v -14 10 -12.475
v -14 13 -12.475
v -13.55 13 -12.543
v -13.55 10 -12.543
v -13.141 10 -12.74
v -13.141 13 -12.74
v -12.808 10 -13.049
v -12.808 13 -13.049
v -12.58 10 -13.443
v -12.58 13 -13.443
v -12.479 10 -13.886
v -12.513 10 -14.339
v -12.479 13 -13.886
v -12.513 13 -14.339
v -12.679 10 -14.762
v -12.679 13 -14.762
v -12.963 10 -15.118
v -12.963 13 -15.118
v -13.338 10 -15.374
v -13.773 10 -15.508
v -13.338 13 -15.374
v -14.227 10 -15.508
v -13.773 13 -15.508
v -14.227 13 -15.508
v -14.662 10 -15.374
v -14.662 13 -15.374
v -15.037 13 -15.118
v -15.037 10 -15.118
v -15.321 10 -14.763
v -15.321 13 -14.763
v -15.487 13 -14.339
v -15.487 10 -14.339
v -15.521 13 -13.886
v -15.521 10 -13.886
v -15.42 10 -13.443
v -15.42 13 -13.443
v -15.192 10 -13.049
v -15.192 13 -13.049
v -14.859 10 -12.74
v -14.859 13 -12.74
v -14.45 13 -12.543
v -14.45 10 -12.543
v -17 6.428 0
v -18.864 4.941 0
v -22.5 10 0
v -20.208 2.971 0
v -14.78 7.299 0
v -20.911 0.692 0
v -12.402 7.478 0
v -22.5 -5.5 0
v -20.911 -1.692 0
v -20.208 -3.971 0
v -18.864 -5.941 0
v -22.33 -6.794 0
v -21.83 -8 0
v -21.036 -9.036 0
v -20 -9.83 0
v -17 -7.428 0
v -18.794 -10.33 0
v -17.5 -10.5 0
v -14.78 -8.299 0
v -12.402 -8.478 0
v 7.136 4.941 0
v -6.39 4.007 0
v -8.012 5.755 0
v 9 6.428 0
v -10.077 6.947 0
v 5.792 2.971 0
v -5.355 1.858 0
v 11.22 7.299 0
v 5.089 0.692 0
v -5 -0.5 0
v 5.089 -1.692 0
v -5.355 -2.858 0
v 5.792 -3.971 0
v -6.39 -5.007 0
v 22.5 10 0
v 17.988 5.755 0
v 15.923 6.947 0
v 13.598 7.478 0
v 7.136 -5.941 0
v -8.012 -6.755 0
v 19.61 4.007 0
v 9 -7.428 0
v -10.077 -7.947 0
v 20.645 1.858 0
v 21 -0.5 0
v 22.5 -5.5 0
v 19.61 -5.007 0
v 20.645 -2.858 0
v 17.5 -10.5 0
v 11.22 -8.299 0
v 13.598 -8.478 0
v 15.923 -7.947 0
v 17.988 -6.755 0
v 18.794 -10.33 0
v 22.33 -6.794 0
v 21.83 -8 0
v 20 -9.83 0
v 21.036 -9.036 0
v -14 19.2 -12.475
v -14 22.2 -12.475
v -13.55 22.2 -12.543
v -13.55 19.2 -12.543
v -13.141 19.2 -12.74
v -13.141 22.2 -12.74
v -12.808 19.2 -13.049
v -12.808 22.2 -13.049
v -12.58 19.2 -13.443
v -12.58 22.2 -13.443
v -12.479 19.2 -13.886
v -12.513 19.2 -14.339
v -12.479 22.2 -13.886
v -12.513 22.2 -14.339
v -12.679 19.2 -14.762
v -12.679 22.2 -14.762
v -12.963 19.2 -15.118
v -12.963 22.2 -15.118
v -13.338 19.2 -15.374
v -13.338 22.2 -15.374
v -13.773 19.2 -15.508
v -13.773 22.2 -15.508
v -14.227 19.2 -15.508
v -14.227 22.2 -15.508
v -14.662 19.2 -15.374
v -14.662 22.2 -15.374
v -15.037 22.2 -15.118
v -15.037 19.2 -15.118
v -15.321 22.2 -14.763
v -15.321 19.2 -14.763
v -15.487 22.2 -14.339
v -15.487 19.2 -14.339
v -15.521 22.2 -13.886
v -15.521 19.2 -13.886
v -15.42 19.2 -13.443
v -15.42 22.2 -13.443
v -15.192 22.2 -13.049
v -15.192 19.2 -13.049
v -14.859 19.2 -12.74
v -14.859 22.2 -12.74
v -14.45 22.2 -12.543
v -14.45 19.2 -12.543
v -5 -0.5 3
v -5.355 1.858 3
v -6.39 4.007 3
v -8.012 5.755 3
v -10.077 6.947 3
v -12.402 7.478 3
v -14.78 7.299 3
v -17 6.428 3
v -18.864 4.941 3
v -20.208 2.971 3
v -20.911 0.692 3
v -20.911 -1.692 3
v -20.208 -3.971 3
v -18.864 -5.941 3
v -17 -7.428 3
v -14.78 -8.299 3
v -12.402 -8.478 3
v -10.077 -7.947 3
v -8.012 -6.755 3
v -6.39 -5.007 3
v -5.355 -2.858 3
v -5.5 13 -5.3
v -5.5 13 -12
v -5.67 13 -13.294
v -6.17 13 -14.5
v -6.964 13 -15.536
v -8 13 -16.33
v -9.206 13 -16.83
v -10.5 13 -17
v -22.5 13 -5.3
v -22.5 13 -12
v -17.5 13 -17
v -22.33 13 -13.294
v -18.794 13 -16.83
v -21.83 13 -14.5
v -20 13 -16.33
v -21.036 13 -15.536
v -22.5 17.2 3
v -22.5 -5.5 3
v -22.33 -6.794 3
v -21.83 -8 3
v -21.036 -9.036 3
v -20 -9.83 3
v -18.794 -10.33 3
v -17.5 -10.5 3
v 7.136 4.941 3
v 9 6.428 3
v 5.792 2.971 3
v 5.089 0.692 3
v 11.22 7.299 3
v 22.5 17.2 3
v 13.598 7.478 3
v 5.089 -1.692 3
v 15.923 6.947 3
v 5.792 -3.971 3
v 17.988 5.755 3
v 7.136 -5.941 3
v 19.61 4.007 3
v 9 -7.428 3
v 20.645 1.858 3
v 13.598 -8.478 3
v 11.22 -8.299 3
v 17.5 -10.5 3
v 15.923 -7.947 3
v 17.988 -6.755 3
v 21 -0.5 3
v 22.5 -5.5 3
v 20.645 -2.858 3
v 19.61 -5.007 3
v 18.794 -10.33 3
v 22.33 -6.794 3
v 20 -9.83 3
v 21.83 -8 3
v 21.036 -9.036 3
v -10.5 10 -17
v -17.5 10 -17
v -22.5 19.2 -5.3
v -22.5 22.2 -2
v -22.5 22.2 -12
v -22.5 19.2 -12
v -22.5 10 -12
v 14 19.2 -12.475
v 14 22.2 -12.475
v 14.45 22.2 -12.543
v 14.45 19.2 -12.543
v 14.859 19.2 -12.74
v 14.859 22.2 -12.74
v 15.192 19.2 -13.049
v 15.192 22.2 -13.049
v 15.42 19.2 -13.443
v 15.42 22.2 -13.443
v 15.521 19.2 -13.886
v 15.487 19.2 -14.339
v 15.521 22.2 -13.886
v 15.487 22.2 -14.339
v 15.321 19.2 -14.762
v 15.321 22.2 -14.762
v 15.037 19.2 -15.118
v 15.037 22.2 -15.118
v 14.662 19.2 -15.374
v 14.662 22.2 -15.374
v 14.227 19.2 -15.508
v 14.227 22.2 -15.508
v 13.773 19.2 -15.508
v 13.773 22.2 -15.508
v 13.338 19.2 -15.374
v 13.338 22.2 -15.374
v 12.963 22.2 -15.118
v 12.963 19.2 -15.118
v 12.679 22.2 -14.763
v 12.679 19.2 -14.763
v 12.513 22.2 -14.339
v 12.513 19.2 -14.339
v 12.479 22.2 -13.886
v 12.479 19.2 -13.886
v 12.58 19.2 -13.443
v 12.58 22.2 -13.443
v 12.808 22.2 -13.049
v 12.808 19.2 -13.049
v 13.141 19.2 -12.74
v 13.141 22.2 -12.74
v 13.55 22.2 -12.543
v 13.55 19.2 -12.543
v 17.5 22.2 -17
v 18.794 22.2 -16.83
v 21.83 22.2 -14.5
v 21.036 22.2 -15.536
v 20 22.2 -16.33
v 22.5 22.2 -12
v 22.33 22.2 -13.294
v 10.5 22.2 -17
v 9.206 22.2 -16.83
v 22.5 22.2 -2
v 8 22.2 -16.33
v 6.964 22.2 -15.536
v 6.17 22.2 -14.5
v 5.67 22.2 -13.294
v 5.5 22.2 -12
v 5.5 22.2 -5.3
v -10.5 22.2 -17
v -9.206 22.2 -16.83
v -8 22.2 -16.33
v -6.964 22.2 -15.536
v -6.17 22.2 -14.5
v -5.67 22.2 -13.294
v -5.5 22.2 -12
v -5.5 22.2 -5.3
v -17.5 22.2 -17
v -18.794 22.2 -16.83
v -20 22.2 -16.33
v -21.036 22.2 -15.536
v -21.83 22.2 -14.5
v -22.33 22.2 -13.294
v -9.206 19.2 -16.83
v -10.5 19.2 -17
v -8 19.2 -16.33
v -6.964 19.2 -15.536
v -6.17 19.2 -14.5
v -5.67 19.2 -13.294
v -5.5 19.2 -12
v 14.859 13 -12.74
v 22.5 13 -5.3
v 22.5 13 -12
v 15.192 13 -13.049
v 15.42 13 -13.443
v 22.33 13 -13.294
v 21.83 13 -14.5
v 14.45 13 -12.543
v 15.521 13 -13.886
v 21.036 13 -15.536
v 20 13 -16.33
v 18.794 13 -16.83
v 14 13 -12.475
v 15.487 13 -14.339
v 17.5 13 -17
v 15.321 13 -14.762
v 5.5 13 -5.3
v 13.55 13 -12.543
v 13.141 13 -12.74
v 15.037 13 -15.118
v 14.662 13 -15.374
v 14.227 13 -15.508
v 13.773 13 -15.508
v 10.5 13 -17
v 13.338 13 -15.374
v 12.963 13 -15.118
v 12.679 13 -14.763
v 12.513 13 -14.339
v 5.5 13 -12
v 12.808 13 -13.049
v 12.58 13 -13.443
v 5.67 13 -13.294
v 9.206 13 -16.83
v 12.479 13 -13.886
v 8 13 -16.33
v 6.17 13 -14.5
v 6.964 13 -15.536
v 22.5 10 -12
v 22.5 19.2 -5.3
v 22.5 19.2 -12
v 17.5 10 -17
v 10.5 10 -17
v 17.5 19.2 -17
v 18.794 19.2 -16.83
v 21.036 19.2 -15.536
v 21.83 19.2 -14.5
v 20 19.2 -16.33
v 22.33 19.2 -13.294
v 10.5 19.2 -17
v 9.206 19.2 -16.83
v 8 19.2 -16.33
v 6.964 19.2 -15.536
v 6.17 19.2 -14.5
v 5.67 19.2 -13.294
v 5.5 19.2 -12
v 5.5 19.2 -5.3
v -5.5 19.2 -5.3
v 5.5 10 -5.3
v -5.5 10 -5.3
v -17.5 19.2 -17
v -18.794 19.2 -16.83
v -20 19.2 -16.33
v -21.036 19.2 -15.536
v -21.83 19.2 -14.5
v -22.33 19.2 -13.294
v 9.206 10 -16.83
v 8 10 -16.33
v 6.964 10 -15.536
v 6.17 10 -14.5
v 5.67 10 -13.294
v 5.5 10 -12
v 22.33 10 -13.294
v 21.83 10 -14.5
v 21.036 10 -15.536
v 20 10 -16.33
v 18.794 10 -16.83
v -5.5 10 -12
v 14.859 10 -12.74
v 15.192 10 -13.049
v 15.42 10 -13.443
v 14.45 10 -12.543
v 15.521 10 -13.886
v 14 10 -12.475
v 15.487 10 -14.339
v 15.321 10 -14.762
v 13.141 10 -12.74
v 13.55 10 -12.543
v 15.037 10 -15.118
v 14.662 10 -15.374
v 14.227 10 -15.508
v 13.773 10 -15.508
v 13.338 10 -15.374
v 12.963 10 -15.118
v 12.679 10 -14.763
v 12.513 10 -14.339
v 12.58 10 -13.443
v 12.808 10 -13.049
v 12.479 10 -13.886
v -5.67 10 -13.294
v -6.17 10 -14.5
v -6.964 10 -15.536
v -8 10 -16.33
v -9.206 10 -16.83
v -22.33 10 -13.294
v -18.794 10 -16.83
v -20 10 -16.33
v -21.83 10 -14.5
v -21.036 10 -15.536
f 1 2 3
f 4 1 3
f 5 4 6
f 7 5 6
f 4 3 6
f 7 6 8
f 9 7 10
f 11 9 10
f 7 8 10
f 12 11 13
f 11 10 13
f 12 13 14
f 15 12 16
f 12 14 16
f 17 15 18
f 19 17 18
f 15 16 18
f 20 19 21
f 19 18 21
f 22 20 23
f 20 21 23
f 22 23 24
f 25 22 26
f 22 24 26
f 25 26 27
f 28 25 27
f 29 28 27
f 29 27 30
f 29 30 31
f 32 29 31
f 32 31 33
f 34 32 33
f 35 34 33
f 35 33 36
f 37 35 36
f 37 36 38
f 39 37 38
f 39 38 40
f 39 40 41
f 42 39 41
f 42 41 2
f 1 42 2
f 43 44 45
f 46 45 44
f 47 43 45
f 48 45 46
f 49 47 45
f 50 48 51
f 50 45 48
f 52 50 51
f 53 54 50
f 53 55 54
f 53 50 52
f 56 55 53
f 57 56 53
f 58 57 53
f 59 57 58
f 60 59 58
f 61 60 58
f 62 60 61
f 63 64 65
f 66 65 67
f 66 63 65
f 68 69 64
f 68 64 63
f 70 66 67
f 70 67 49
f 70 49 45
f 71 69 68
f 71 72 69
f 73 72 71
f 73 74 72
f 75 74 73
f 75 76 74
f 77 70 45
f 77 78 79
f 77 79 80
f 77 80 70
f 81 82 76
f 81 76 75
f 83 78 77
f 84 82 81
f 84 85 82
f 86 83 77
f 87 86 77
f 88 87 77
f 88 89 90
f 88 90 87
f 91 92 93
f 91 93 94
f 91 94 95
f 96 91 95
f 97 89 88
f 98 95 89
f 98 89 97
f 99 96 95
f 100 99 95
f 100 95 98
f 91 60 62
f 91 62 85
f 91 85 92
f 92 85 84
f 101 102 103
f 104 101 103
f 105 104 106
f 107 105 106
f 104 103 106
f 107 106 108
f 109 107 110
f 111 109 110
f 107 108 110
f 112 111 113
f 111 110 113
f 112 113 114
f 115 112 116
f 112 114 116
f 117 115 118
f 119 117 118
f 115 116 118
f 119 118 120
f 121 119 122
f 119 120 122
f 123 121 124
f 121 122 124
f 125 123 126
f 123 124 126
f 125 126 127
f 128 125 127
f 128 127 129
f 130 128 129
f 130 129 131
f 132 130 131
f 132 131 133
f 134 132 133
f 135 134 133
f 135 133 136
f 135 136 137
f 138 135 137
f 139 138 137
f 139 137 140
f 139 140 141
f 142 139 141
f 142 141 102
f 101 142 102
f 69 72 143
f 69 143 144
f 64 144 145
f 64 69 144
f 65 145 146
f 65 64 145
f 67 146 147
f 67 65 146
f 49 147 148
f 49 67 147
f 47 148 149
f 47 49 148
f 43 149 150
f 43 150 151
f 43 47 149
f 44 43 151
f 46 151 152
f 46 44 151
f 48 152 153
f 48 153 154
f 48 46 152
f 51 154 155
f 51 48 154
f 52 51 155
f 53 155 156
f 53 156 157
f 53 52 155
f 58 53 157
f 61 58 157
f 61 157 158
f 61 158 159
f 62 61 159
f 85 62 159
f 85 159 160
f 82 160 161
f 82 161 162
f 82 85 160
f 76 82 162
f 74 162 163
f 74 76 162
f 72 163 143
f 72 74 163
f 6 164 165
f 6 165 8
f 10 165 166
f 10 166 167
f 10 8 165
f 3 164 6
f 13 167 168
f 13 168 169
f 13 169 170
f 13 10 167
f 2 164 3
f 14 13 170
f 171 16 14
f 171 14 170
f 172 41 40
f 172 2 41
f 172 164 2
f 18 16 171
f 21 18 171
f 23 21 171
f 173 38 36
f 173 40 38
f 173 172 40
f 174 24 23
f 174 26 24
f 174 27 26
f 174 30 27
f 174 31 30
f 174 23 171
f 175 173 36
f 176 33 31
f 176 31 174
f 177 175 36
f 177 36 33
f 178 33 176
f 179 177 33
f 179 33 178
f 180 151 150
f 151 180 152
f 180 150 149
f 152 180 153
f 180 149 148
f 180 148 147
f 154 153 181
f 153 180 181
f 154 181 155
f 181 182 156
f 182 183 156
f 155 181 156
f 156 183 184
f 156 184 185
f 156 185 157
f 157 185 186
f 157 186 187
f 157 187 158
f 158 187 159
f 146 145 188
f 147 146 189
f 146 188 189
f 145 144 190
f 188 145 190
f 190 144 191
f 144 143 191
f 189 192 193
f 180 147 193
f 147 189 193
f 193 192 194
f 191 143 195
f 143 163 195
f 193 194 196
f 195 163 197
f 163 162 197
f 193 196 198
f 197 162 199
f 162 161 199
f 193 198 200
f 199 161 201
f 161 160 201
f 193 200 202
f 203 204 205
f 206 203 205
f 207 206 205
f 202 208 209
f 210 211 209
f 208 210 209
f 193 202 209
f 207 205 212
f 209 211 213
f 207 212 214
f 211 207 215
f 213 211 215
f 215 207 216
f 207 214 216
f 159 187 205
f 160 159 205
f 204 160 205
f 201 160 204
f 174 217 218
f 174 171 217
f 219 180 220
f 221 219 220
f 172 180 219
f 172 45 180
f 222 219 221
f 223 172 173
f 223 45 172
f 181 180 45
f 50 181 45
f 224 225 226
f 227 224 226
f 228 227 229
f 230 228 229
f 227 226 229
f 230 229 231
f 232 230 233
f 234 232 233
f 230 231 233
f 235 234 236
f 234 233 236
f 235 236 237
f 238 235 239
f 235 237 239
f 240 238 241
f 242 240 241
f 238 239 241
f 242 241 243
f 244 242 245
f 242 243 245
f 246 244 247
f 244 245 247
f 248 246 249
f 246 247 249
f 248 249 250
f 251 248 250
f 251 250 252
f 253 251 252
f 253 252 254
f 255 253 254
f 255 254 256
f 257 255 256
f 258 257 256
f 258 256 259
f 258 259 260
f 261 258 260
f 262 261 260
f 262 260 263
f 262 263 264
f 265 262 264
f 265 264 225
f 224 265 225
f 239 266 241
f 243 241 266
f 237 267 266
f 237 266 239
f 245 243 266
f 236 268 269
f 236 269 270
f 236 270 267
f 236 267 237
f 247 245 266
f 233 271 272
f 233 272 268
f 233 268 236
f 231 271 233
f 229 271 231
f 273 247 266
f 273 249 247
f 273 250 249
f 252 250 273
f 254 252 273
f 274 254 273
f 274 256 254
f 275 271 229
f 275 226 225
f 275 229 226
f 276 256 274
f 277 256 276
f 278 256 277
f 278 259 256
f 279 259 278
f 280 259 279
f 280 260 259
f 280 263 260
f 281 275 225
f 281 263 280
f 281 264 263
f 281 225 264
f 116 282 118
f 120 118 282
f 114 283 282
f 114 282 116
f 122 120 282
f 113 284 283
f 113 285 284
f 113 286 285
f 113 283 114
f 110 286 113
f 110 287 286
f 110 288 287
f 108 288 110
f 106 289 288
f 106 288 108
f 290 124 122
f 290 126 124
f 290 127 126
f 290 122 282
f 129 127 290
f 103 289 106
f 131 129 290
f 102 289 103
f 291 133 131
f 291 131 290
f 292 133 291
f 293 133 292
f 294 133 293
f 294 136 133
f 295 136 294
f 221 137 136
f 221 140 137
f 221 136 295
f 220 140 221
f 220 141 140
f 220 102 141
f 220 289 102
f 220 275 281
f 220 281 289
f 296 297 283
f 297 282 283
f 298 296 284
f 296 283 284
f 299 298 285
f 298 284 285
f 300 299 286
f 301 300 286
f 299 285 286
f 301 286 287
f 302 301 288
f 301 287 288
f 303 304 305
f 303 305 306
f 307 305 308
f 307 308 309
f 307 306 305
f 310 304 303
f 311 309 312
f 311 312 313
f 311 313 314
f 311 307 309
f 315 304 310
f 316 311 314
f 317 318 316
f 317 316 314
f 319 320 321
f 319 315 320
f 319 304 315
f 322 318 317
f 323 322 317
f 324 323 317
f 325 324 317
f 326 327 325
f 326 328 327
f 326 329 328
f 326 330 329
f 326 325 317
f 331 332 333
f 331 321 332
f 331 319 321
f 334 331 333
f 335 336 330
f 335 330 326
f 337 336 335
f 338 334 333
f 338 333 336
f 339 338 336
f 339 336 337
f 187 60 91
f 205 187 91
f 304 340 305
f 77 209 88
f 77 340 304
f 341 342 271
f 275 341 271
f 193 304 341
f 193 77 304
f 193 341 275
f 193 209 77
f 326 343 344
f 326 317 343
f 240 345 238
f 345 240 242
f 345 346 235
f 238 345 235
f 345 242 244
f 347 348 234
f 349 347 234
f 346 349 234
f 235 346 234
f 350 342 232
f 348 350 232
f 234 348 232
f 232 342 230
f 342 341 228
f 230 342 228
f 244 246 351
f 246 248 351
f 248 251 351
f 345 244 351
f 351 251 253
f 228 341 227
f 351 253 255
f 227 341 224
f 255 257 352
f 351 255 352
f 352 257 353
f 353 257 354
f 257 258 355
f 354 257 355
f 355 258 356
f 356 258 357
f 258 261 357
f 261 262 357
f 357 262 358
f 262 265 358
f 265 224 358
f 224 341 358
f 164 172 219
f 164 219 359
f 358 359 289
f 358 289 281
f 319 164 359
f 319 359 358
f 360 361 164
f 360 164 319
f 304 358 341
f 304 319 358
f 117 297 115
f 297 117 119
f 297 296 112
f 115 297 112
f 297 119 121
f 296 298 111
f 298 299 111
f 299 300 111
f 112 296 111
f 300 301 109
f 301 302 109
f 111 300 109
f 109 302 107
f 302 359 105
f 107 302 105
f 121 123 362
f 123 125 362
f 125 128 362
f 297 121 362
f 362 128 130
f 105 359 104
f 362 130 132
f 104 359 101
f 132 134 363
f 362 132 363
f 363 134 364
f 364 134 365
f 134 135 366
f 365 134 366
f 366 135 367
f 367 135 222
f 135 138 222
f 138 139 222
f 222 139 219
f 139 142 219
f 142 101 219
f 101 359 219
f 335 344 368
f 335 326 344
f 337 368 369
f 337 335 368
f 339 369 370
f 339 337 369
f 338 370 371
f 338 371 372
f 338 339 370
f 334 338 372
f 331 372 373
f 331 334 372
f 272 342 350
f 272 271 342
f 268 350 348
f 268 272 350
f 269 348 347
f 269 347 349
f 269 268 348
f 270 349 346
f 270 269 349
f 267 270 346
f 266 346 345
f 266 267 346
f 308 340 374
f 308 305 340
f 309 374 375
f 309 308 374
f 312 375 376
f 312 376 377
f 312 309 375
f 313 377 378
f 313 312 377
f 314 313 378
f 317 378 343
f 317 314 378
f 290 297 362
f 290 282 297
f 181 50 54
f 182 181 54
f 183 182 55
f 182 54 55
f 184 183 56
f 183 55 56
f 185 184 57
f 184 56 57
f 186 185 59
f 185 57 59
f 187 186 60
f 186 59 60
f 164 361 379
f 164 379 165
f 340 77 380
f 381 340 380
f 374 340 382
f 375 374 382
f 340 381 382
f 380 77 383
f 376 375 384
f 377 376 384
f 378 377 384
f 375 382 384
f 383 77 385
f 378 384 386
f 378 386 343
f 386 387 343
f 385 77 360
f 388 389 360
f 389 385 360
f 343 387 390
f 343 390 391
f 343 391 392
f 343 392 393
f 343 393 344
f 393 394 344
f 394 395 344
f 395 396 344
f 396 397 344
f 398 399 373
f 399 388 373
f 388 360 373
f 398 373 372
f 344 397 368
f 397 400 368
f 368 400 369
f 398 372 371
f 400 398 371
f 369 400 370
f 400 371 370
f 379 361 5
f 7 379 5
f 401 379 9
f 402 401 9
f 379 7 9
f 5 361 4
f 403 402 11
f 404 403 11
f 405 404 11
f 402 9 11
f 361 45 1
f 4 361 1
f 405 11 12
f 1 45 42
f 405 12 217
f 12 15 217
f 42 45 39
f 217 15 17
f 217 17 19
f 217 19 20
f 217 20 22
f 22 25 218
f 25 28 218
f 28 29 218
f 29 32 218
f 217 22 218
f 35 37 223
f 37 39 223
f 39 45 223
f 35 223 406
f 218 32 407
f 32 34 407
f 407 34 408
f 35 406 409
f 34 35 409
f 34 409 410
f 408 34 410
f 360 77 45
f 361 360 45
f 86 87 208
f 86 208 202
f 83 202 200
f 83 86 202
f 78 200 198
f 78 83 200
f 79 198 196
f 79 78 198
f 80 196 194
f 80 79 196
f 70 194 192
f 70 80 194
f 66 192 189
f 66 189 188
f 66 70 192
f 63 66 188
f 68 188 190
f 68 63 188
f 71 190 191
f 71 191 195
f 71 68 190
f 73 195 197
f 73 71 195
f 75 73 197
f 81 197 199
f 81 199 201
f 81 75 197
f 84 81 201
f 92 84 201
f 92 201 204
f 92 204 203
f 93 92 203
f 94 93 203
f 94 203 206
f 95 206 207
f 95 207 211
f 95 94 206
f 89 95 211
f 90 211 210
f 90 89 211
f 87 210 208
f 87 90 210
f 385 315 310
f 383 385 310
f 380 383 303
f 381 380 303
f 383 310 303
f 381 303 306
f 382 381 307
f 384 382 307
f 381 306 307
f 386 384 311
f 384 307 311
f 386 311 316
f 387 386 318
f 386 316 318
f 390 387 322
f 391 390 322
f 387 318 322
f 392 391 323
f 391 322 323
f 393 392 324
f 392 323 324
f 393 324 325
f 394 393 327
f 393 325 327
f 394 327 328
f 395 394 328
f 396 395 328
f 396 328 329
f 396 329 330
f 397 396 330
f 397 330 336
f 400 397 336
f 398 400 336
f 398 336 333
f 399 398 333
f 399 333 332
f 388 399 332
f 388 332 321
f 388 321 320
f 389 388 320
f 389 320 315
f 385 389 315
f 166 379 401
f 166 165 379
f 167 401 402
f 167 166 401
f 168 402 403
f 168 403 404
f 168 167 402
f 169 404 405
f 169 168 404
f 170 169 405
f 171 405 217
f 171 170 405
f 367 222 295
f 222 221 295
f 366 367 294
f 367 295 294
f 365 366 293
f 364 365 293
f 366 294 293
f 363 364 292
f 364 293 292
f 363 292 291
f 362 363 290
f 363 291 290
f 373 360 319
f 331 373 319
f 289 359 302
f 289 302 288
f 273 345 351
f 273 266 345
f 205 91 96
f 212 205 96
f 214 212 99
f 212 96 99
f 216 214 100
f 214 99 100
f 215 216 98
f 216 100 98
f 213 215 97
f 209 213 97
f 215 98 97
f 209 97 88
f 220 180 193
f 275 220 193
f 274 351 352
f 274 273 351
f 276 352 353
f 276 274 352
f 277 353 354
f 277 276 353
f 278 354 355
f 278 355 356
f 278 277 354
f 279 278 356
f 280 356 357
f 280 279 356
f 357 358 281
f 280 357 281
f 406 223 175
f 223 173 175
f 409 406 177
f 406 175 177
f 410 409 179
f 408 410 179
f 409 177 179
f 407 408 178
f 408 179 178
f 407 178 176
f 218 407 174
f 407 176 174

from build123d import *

# Parameters (mm, degrees)
SKETCH1_R           = 8
BOSS_EXTRUDE1_DEPTH = 3
SKETCH2_W           = 17
SKETCH2_H           = 3
BOSS_EXTRUDE2_DEPTH = 17
SKETCH3_W           = 45
SKETCH3_H           = 3
BOSS_EXTRUDE3_DEPTH = 9.2
BOSS_EXTRUDE4_REACH = 41.571
SKETCH4_W           = 5.3
SKETCH4_H           = 3
SKETCH6_W           = 45
SKETCH6_H           = 5.3
BOSS_EXTRUDE5_DEPTH = 9.2
SKETCH7_W           = 17
SKETCH7_H           = 3
BOSS_EXTRUDE6_DEPTH = 11.7
SKETCH8_R           = 1.525
CUT_EXTRUDE1_DEPTH  = 44.180319591
CHAMFER1_SIZE       = 5
FILLET1_R           = 5


with BuildPart() as part:
    # Sketch1 → Boss-Extrude1 (new body)
    with BuildSketch(Plane.XY):
        with BuildLine():
            Line((-17.5, -10.5), (17.5, -10.5))
            ThreePointArc((17.5, -10.5), (21.035533906, -9.035533906), (22.5, -5.5))
            Line((22.5, -5.5), (22.5, 10.5))
            Line((22.5, 10.5), (22.5, 13))
            Line((22.5, 13), (-22.5, 13))
            Line((-22.5, 13), (-22.5, 10.5))
            Line((-22.5, 10.5), (-22.5, -5.5))
            ThreePointArc((-22.5, -5.5), (-21.035533906, -9.035533906), (-17.5, -10.5))
        make_face()
        with Locations((13, -0.5)):
            Circle(SKETCH1_R, mode=Mode.SUBTRACT)
        with Locations((-13, -0.5)):
            Circle(SKETCH1_R, mode=Mode.SUBTRACT)
    extrude(amount=BOSS_EXTRUDE1_DEPTH)

    # Sketch2 → Boss-Extrude2 (add)
    with BuildSketch(Plane(origin=(0, 0, 0), x_dir=(-1, 0, 0), z_dir=(0, 0, -1))):
        with Locations((-14, 11.5)):
            Rectangle(SKETCH2_W, SKETCH2_H)
        with Locations((14, 11.5)):
            Rectangle(SKETCH2_W, SKETCH2_H)
    extrude(amount=BOSS_EXTRUDE2_DEPTH)

    # Sketch3 → Boss-Extrude3 (add)
    with BuildSketch(Plane(origin=(0, 13, 0), x_dir=(1, 0, 0), z_dir=(0, 1, 0))):
        with Locations((0, -1.5)):
            Rectangle(SKETCH3_W, SKETCH3_H)
    extrude(amount=BOSS_EXTRUDE3_DEPTH)

    # Sketch4 → Boss-Extrude4 (add, up to next)
    with BuildSketch(Plane(origin=(-5.5, 0, 0), x_dir=(0, 0, -1), z_dir=(1, 0, 0)), mode=Mode.PRIVATE) as boss_extrude4_sk1:
        with Locations((2.65, 11.5)):
            Rectangle(SKETCH4_W, SKETCH4_H)
    boss_extrude4_tool1 = extrude(boss_extrude4_sk1.sketch, amount=BOSS_EXTRUDE4_REACH, mode=Mode.PRIVATE) - part.part
    add(boss_extrude4_tool1.solids().sort_by_distance((-5.5, 11.5, -2.65))[0])

    # Sketch6 → Boss-Extrude5 (add)
    with BuildSketch(Plane(origin=(0, 13, 0), x_dir=(1, 0, 0), z_dir=(0, 1, 0))):
        with Locations((0, 2.65)):
            Rectangle(SKETCH6_W, SKETCH6_H)
    extrude(amount=BOSS_EXTRUDE5_DEPTH)

    # Sketch7 → Boss-Extrude6 (add, through all)
    with BuildSketch(Plane(origin=(0, 0, -5.3), x_dir=(-1, 0, 0), z_dir=(0, 0, -1))):
        with Locations((-14, 20.7)):
            Rectangle(SKETCH7_W, SKETCH7_H)
        with Locations((14, 20.7)):
            Rectangle(SKETCH7_W, SKETCH7_H)
    extrude(amount=BOSS_EXTRUDE6_DEPTH)

    # Sketch8 → Cut-Extrude1 (cut, through all)
    with BuildSketch(Plane(origin=(0, 22.2, 0), x_dir=(1, 0, 0), z_dir=(0, 1, 0))):
        with Locations(Location((14, 14, 0), (0, 0, 270))):
            Circle(SKETCH8_R)
        with Locations(Location((-14, 14, 0), (0, 0, 270))):
            Circle(SKETCH8_R)
    extrude(amount=-CUT_EXTRUDE1_DEPTH, mode=Mode.SUBTRACT)

    # Chamfer1
    chamfer1_edges = [part.edges().sort_by_distance(p)[0] for p in [
        (0, 22.2, 3),
    ]]
    chamfer(chamfer1_edges, length=CHAMFER1_SIZE)

    # Fillet1
    fillet1_edges = [part.edges().sort_by_distance(p)[0] for p in [
        (22.5, 20.7, -17),
        (5.5, 20.7, -17),
        (-22.5, 20.7, -17),
        (-5.5, 20.7, -17),
        (5.5, 11.5, -17),
        (22.5, 11.5, -17),
        (-5.5, 11.5, -17),
        (-22.5, 11.5, -17),
    ]]
    fillet(fillet1_edges, radius=FILLET1_R)


solid = part.part
